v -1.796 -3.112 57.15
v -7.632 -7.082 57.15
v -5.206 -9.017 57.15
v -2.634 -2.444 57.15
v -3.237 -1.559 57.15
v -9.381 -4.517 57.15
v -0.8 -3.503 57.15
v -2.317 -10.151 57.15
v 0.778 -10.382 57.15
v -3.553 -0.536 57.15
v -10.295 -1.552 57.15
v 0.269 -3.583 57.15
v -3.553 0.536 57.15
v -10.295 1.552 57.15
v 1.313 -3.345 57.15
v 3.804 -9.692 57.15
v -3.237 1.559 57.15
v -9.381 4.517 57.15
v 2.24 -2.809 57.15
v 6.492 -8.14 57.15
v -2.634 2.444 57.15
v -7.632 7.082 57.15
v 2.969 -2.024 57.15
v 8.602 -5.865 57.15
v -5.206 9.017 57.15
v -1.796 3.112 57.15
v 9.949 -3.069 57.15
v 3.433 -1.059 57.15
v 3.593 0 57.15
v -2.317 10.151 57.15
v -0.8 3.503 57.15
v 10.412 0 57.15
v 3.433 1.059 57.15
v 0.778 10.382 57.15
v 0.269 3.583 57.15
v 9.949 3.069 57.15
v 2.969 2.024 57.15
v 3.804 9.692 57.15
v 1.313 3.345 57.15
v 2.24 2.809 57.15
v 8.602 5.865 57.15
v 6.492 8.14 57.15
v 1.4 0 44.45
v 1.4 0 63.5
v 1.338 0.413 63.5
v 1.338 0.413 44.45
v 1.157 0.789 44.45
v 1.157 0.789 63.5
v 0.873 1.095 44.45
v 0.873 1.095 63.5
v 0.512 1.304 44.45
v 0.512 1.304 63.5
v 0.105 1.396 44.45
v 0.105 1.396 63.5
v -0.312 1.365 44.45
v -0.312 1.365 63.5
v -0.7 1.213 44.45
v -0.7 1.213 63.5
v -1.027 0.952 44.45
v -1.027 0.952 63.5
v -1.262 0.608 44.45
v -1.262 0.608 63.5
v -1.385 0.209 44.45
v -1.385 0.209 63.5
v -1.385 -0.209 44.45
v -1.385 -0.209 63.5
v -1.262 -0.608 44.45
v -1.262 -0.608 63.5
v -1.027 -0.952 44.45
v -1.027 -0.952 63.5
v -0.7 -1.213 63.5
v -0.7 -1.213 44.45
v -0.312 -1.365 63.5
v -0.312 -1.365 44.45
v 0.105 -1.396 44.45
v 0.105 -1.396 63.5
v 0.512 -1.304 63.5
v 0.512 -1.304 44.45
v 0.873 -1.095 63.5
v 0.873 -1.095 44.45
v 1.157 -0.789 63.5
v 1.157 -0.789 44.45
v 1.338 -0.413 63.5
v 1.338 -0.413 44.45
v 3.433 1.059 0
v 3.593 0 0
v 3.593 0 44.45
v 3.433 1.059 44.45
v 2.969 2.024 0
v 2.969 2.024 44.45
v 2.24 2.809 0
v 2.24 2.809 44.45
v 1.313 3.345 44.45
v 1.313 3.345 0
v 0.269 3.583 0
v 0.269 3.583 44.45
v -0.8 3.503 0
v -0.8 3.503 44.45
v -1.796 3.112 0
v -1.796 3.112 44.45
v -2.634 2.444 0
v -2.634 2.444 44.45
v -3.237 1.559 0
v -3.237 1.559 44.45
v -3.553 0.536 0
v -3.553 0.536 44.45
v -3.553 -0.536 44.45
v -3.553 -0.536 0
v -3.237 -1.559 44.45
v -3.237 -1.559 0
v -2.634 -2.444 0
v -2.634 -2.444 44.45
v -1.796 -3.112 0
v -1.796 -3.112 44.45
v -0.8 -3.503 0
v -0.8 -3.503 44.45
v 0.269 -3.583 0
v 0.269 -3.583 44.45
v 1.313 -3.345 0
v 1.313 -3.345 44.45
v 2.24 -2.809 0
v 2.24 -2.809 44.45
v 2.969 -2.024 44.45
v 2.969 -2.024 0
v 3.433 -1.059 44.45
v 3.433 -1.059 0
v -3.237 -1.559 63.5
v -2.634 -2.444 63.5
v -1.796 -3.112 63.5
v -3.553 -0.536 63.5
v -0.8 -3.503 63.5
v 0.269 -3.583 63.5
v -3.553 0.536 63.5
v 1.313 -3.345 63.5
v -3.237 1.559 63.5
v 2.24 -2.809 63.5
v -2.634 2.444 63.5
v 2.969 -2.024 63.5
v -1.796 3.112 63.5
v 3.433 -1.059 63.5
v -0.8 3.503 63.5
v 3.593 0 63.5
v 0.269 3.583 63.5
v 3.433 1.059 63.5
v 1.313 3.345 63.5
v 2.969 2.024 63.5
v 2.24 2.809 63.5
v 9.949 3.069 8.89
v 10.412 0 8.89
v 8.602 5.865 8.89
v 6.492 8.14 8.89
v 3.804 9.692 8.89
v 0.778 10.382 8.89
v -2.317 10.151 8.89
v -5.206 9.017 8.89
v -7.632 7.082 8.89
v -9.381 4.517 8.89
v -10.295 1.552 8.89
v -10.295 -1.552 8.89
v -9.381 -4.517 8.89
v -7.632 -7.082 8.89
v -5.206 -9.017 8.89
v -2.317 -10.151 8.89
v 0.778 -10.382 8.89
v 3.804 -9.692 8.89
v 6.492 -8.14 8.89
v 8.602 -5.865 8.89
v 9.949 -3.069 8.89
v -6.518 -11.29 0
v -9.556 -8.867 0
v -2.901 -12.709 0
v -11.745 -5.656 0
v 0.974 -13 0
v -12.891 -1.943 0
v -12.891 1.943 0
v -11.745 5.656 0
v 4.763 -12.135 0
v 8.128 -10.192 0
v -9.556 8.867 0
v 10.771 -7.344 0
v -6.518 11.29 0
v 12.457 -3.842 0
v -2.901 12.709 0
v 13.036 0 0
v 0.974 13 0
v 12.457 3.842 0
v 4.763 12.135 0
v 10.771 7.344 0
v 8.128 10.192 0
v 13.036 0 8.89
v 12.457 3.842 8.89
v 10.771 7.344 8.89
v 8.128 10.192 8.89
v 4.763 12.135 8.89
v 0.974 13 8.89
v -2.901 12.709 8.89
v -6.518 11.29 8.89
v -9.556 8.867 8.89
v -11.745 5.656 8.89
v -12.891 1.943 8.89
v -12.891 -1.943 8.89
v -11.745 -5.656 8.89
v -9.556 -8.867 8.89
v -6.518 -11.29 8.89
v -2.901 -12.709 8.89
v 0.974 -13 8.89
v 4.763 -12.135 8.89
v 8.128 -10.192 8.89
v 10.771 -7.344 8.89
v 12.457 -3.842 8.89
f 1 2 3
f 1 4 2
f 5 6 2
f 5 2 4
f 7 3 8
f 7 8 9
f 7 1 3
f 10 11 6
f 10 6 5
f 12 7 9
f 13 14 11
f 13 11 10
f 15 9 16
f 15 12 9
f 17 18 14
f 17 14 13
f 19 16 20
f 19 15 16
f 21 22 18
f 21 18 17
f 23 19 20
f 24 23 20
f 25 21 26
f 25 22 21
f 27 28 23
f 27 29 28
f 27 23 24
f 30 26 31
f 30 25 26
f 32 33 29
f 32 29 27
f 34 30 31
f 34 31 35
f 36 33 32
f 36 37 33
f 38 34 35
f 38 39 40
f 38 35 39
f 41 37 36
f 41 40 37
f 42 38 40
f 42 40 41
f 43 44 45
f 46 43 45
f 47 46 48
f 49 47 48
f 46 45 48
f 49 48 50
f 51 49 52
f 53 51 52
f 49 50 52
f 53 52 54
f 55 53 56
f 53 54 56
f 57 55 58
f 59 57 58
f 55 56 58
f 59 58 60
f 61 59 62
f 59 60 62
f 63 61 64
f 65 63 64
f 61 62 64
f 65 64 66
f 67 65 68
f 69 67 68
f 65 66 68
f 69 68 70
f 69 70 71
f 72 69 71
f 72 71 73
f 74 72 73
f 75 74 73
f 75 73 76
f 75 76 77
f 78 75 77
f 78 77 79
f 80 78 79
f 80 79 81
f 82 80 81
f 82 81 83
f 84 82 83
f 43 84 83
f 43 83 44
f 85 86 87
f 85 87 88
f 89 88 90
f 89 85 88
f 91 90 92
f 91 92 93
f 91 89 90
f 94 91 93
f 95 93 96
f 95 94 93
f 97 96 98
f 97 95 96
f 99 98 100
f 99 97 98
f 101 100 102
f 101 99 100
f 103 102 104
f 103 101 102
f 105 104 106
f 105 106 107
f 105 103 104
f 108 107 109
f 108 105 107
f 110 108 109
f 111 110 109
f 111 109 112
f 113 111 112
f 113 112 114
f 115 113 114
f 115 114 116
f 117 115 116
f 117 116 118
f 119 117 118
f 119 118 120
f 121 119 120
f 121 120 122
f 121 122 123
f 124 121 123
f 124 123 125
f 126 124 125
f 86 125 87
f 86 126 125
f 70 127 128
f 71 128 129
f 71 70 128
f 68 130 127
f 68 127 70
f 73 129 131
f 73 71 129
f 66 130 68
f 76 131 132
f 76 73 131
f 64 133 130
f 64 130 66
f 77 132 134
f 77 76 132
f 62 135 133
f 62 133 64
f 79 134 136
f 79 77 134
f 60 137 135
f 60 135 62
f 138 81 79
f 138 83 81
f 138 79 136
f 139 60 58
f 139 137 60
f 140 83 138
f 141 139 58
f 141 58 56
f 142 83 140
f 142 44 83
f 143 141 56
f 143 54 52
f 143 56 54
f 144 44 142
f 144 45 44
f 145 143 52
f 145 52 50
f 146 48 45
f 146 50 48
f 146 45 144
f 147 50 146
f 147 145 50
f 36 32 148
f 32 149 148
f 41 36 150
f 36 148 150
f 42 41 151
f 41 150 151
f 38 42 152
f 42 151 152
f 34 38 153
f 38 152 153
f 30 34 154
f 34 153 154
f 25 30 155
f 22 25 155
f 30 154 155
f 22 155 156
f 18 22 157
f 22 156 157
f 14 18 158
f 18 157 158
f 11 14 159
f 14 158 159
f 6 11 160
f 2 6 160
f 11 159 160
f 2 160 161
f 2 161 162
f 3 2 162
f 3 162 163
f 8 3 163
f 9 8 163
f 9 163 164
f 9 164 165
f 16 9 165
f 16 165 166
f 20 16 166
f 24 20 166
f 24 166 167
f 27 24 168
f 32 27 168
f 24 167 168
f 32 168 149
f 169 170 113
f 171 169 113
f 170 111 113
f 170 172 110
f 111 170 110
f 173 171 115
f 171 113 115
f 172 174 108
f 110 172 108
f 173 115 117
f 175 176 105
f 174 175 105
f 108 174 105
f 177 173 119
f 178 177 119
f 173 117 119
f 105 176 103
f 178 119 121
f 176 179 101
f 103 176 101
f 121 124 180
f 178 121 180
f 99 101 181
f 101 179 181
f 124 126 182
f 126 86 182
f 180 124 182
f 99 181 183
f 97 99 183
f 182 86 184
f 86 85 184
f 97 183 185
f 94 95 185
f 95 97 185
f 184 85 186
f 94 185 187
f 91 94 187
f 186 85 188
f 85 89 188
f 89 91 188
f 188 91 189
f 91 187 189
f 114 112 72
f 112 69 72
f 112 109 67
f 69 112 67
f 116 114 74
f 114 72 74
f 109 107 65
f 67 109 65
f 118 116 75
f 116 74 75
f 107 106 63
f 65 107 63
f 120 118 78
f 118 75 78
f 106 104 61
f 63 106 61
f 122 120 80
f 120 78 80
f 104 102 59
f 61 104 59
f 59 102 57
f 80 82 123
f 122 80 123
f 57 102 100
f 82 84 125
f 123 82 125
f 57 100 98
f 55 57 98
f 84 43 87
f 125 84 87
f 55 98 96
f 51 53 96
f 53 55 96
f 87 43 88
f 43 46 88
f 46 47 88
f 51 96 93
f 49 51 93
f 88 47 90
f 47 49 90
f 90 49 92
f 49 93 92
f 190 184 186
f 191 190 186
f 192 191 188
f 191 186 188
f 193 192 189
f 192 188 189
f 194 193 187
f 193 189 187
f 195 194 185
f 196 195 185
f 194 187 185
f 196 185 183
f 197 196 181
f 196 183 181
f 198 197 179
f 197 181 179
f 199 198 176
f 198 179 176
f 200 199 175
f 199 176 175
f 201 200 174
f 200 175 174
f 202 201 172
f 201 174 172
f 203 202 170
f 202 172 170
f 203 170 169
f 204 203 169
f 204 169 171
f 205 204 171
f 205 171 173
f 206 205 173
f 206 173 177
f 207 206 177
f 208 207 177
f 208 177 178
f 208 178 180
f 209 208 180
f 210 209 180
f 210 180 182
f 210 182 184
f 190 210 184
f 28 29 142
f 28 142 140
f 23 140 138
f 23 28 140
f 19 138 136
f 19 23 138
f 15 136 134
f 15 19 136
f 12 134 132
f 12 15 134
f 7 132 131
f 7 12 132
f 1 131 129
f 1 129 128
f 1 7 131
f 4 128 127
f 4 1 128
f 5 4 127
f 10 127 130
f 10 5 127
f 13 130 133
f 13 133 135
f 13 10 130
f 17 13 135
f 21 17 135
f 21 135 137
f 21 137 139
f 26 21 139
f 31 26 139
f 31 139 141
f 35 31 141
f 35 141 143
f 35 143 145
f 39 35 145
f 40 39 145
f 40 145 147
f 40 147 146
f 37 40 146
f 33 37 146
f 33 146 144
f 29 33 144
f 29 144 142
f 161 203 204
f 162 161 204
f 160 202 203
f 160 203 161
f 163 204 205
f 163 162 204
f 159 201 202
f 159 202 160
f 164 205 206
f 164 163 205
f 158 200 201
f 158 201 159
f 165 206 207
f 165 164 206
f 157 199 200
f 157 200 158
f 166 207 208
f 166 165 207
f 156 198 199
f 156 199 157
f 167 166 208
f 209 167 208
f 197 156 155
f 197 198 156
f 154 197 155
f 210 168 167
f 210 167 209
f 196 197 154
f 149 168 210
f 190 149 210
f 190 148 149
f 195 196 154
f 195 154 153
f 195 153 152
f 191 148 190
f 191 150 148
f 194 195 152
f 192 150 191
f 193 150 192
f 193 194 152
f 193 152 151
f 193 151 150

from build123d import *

# Parameters (mm, degrees)
F0_R     = 13.0362037077
F0_R_2   = 10.4116007046
F0_R_3   = 3.592976873
F1_DEPTH = 12.7
F2_DEPTH = 57.15
F3_DEPTH = 50.8
F4_DEPTH = 3.81
F5_DEPTH = 44.45
F6_R     = 1.4003561132
F7_DEPTH = 63.501


with BuildPart() as f1:
    # F0 (on Top) → F1 (new body)
    with BuildSketch(Plane.XY):
        Circle(F0_R)
        Circle(F0_R_2, mode=Mode.SUBTRACT)
        Circle(F0_R_2)
        Circle(F0_R_3, mode=Mode.SUBTRACT)
        Circle(F0_R_3)
    extrude(amount=F1_DEPTH)

    # F0 (on Top) → F2 (join)
    with BuildSketch(Plane.XY):
        Circle(F0_R_2)
        Circle(F0_R_3, mode=Mode.SUBTRACT)
    extrude(amount=F2_DEPTH)

    # F3 (add): a face of the model
    f3_faces = [f1.faces().sort_by_distance(p)[0] for p in [
        (0, 0, 12.7),
    ]]
    extrude(f3_faces, amount=F3_DEPTH)

    # F4 (cut): a face of the model
    f4_faces = [f1.faces().sort_by_distance(p)[0] for p in [
        (-12.667484186, 0, 12.7),
    ]]
    extrude(f4_faces, amount=-F4_DEPTH, mode=Mode.SUBTRACT)

    # F0 (on Top) → F5 (cut)
    with BuildSketch(Plane.XY):
        Circle(F0_R_3)
    extrude(amount=F5_DEPTH, mode=Mode.SUBTRACT)

    # F6 (on face) → F7 (cut, through all)
    with BuildSketch(Plane.XY.offset(63.5)):
        Circle(F6_R)
    extrude(amount=-F7_DEPTH, mode=Mode.SUBTRACT)


solid = f1.part
